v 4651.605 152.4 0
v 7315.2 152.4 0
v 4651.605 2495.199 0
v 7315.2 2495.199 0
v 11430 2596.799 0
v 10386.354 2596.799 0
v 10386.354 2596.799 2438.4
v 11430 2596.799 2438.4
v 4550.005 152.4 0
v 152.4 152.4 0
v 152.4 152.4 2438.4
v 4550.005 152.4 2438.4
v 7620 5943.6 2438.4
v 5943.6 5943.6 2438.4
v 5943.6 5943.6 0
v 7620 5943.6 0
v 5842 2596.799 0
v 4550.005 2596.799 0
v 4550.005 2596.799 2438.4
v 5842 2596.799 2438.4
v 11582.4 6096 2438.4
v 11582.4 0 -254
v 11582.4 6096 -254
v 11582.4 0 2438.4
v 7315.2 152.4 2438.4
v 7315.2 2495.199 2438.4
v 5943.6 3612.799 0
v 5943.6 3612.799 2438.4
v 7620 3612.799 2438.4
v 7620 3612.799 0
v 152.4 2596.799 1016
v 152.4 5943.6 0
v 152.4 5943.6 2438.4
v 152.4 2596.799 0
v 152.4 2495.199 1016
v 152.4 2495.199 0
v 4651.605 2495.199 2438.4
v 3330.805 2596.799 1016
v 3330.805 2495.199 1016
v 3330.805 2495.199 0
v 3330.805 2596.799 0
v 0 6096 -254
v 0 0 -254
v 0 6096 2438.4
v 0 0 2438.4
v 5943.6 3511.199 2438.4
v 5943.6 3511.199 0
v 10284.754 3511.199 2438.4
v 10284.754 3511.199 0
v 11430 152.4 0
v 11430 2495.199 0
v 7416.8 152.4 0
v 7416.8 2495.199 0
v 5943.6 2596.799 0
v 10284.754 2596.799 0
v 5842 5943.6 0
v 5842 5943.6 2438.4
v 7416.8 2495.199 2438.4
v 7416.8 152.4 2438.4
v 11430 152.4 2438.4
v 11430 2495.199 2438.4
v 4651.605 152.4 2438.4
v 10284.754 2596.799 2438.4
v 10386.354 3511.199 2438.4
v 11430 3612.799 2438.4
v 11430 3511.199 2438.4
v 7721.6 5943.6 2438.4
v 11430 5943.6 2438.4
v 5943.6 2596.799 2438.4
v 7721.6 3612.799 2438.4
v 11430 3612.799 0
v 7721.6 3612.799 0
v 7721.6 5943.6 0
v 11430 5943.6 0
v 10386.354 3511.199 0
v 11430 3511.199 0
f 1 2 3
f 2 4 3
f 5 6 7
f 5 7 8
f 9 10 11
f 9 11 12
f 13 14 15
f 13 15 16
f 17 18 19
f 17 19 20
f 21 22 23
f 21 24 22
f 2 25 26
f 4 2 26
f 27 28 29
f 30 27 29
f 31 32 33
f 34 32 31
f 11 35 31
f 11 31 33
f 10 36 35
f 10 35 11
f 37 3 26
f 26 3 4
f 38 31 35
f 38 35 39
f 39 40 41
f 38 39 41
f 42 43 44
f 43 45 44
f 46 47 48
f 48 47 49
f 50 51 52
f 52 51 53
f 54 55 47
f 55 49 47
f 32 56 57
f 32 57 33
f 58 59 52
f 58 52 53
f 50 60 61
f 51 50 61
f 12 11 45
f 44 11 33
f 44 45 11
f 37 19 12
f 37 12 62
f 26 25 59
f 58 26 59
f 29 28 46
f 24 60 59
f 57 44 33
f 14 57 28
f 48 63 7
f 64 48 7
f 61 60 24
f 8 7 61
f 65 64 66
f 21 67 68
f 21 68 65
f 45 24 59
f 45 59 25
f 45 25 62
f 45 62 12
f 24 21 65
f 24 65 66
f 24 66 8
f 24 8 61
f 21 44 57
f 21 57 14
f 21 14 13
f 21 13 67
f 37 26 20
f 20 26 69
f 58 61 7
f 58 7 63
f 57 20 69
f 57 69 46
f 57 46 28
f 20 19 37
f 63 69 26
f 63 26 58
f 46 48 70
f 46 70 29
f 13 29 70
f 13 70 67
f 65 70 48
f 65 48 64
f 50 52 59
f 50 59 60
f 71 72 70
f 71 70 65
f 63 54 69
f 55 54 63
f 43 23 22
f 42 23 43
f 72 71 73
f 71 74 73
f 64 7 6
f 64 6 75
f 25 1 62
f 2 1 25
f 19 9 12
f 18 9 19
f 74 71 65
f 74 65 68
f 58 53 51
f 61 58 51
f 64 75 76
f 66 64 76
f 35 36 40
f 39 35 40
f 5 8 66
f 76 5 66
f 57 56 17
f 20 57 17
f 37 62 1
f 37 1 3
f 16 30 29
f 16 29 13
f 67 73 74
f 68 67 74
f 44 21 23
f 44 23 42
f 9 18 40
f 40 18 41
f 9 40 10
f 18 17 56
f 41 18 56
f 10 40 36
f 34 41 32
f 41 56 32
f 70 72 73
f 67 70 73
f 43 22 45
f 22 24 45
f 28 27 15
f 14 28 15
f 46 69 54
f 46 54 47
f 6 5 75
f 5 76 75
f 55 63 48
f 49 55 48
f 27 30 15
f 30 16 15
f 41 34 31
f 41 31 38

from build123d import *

# Parameters (mm, degrees)
SKETCH3_W           = 11582.4
SKETCH3_H           = 6096
SKETCH3_W_2         = 4341.154286856
SKETCH3_H_2         = 914.4
SKETCH3_W_3         = 1676.4
SKETCH3_H_3         = 2330.801356814
SKETCH3_W_4         = 2663.595025017
SKETCH3_H_4         = 2342.798643186
SKETCH3_W_5         = 1043.645713144
SKETCH3_W_6         = 4013.2
SKETCH3_W_7         = 3708.4
BOSS_EXTRUDE1_DEPTH = 2438.4
SKETCH4_W           = 11582.4
SKETCH4_H           = 6096
BOSS_EXTRUDE2_DEPTH = 254
SKETCH5_W           = 3178.404974983
SKETCH5_H           = 101.6
BOSS_EXTRUDE3_DEPTH = 1016


with BuildPart() as part:
    # Sketch3 → Boss-Extrude1 (new body)
    with BuildSketch(Plane.XY):
        with Locations((5791.2, 3048)):
            Rectangle(SKETCH3_W, SKETCH3_H)
        Polygon((152.4, 152.4), (4550.004974983, 152.4), (4550.004974983, 2596.798643186), (5842, 2596.798643186), (5842, 3511.198643186), (5842, 5943.6), (152.4, 5943.6), align=None, mode=Mode.SUBTRACT)
        with Locations((8114.177143428, 3053.998643186)):
            Rectangle(SKETCH3_W_2, SKETCH3_H_2, mode=Mode.SUBTRACT)
        with Locations((6781.8, 4778.199321593)):
            Rectangle(SKETCH3_W_3, SKETCH3_H_3, mode=Mode.SUBTRACT)
        with Locations((5983.402487492, 1323.799321593)):
            Rectangle(SKETCH3_W_4, SKETCH3_H_4, mode=Mode.SUBTRACT)
        with Locations((10908.177143428, 3053.998643186)):
            Rectangle(SKETCH3_W_5, SKETCH3_H_2, mode=Mode.SUBTRACT)
        with Locations((9423.4, 1323.799321593)):
            Rectangle(SKETCH3_W_6, SKETCH3_H_4, mode=Mode.SUBTRACT)
        with Locations((9575.8, 4778.199321593)):
            Rectangle(SKETCH3_W_7, SKETCH3_H_3, mode=Mode.SUBTRACT)
    extrude(amount=BOSS_EXTRUDE1_DEPTH)

    # Sketch4 → Boss-Extrude2 (add)
    with BuildSketch(Plane(origin=(0, 0, 0), x_dir=(-1, 0, 0), z_dir=(0, 0, -1))):
        with Locations((-5791.2, 3048)):
            Rectangle(SKETCH4_W, SKETCH4_H)
    extrude(amount=BOSS_EXTRUDE2_DEPTH)

    # Sketch5 → Boss-Extrude3 (add)
    with BuildSketch(Plane.XY):
        with Locations((1741.602487492, 2545.998643186)):
            Rectangle(SKETCH5_W, SKETCH5_H)
    extrude(amount=BOSS_EXTRUDE3_DEPTH)


solid = part.part
